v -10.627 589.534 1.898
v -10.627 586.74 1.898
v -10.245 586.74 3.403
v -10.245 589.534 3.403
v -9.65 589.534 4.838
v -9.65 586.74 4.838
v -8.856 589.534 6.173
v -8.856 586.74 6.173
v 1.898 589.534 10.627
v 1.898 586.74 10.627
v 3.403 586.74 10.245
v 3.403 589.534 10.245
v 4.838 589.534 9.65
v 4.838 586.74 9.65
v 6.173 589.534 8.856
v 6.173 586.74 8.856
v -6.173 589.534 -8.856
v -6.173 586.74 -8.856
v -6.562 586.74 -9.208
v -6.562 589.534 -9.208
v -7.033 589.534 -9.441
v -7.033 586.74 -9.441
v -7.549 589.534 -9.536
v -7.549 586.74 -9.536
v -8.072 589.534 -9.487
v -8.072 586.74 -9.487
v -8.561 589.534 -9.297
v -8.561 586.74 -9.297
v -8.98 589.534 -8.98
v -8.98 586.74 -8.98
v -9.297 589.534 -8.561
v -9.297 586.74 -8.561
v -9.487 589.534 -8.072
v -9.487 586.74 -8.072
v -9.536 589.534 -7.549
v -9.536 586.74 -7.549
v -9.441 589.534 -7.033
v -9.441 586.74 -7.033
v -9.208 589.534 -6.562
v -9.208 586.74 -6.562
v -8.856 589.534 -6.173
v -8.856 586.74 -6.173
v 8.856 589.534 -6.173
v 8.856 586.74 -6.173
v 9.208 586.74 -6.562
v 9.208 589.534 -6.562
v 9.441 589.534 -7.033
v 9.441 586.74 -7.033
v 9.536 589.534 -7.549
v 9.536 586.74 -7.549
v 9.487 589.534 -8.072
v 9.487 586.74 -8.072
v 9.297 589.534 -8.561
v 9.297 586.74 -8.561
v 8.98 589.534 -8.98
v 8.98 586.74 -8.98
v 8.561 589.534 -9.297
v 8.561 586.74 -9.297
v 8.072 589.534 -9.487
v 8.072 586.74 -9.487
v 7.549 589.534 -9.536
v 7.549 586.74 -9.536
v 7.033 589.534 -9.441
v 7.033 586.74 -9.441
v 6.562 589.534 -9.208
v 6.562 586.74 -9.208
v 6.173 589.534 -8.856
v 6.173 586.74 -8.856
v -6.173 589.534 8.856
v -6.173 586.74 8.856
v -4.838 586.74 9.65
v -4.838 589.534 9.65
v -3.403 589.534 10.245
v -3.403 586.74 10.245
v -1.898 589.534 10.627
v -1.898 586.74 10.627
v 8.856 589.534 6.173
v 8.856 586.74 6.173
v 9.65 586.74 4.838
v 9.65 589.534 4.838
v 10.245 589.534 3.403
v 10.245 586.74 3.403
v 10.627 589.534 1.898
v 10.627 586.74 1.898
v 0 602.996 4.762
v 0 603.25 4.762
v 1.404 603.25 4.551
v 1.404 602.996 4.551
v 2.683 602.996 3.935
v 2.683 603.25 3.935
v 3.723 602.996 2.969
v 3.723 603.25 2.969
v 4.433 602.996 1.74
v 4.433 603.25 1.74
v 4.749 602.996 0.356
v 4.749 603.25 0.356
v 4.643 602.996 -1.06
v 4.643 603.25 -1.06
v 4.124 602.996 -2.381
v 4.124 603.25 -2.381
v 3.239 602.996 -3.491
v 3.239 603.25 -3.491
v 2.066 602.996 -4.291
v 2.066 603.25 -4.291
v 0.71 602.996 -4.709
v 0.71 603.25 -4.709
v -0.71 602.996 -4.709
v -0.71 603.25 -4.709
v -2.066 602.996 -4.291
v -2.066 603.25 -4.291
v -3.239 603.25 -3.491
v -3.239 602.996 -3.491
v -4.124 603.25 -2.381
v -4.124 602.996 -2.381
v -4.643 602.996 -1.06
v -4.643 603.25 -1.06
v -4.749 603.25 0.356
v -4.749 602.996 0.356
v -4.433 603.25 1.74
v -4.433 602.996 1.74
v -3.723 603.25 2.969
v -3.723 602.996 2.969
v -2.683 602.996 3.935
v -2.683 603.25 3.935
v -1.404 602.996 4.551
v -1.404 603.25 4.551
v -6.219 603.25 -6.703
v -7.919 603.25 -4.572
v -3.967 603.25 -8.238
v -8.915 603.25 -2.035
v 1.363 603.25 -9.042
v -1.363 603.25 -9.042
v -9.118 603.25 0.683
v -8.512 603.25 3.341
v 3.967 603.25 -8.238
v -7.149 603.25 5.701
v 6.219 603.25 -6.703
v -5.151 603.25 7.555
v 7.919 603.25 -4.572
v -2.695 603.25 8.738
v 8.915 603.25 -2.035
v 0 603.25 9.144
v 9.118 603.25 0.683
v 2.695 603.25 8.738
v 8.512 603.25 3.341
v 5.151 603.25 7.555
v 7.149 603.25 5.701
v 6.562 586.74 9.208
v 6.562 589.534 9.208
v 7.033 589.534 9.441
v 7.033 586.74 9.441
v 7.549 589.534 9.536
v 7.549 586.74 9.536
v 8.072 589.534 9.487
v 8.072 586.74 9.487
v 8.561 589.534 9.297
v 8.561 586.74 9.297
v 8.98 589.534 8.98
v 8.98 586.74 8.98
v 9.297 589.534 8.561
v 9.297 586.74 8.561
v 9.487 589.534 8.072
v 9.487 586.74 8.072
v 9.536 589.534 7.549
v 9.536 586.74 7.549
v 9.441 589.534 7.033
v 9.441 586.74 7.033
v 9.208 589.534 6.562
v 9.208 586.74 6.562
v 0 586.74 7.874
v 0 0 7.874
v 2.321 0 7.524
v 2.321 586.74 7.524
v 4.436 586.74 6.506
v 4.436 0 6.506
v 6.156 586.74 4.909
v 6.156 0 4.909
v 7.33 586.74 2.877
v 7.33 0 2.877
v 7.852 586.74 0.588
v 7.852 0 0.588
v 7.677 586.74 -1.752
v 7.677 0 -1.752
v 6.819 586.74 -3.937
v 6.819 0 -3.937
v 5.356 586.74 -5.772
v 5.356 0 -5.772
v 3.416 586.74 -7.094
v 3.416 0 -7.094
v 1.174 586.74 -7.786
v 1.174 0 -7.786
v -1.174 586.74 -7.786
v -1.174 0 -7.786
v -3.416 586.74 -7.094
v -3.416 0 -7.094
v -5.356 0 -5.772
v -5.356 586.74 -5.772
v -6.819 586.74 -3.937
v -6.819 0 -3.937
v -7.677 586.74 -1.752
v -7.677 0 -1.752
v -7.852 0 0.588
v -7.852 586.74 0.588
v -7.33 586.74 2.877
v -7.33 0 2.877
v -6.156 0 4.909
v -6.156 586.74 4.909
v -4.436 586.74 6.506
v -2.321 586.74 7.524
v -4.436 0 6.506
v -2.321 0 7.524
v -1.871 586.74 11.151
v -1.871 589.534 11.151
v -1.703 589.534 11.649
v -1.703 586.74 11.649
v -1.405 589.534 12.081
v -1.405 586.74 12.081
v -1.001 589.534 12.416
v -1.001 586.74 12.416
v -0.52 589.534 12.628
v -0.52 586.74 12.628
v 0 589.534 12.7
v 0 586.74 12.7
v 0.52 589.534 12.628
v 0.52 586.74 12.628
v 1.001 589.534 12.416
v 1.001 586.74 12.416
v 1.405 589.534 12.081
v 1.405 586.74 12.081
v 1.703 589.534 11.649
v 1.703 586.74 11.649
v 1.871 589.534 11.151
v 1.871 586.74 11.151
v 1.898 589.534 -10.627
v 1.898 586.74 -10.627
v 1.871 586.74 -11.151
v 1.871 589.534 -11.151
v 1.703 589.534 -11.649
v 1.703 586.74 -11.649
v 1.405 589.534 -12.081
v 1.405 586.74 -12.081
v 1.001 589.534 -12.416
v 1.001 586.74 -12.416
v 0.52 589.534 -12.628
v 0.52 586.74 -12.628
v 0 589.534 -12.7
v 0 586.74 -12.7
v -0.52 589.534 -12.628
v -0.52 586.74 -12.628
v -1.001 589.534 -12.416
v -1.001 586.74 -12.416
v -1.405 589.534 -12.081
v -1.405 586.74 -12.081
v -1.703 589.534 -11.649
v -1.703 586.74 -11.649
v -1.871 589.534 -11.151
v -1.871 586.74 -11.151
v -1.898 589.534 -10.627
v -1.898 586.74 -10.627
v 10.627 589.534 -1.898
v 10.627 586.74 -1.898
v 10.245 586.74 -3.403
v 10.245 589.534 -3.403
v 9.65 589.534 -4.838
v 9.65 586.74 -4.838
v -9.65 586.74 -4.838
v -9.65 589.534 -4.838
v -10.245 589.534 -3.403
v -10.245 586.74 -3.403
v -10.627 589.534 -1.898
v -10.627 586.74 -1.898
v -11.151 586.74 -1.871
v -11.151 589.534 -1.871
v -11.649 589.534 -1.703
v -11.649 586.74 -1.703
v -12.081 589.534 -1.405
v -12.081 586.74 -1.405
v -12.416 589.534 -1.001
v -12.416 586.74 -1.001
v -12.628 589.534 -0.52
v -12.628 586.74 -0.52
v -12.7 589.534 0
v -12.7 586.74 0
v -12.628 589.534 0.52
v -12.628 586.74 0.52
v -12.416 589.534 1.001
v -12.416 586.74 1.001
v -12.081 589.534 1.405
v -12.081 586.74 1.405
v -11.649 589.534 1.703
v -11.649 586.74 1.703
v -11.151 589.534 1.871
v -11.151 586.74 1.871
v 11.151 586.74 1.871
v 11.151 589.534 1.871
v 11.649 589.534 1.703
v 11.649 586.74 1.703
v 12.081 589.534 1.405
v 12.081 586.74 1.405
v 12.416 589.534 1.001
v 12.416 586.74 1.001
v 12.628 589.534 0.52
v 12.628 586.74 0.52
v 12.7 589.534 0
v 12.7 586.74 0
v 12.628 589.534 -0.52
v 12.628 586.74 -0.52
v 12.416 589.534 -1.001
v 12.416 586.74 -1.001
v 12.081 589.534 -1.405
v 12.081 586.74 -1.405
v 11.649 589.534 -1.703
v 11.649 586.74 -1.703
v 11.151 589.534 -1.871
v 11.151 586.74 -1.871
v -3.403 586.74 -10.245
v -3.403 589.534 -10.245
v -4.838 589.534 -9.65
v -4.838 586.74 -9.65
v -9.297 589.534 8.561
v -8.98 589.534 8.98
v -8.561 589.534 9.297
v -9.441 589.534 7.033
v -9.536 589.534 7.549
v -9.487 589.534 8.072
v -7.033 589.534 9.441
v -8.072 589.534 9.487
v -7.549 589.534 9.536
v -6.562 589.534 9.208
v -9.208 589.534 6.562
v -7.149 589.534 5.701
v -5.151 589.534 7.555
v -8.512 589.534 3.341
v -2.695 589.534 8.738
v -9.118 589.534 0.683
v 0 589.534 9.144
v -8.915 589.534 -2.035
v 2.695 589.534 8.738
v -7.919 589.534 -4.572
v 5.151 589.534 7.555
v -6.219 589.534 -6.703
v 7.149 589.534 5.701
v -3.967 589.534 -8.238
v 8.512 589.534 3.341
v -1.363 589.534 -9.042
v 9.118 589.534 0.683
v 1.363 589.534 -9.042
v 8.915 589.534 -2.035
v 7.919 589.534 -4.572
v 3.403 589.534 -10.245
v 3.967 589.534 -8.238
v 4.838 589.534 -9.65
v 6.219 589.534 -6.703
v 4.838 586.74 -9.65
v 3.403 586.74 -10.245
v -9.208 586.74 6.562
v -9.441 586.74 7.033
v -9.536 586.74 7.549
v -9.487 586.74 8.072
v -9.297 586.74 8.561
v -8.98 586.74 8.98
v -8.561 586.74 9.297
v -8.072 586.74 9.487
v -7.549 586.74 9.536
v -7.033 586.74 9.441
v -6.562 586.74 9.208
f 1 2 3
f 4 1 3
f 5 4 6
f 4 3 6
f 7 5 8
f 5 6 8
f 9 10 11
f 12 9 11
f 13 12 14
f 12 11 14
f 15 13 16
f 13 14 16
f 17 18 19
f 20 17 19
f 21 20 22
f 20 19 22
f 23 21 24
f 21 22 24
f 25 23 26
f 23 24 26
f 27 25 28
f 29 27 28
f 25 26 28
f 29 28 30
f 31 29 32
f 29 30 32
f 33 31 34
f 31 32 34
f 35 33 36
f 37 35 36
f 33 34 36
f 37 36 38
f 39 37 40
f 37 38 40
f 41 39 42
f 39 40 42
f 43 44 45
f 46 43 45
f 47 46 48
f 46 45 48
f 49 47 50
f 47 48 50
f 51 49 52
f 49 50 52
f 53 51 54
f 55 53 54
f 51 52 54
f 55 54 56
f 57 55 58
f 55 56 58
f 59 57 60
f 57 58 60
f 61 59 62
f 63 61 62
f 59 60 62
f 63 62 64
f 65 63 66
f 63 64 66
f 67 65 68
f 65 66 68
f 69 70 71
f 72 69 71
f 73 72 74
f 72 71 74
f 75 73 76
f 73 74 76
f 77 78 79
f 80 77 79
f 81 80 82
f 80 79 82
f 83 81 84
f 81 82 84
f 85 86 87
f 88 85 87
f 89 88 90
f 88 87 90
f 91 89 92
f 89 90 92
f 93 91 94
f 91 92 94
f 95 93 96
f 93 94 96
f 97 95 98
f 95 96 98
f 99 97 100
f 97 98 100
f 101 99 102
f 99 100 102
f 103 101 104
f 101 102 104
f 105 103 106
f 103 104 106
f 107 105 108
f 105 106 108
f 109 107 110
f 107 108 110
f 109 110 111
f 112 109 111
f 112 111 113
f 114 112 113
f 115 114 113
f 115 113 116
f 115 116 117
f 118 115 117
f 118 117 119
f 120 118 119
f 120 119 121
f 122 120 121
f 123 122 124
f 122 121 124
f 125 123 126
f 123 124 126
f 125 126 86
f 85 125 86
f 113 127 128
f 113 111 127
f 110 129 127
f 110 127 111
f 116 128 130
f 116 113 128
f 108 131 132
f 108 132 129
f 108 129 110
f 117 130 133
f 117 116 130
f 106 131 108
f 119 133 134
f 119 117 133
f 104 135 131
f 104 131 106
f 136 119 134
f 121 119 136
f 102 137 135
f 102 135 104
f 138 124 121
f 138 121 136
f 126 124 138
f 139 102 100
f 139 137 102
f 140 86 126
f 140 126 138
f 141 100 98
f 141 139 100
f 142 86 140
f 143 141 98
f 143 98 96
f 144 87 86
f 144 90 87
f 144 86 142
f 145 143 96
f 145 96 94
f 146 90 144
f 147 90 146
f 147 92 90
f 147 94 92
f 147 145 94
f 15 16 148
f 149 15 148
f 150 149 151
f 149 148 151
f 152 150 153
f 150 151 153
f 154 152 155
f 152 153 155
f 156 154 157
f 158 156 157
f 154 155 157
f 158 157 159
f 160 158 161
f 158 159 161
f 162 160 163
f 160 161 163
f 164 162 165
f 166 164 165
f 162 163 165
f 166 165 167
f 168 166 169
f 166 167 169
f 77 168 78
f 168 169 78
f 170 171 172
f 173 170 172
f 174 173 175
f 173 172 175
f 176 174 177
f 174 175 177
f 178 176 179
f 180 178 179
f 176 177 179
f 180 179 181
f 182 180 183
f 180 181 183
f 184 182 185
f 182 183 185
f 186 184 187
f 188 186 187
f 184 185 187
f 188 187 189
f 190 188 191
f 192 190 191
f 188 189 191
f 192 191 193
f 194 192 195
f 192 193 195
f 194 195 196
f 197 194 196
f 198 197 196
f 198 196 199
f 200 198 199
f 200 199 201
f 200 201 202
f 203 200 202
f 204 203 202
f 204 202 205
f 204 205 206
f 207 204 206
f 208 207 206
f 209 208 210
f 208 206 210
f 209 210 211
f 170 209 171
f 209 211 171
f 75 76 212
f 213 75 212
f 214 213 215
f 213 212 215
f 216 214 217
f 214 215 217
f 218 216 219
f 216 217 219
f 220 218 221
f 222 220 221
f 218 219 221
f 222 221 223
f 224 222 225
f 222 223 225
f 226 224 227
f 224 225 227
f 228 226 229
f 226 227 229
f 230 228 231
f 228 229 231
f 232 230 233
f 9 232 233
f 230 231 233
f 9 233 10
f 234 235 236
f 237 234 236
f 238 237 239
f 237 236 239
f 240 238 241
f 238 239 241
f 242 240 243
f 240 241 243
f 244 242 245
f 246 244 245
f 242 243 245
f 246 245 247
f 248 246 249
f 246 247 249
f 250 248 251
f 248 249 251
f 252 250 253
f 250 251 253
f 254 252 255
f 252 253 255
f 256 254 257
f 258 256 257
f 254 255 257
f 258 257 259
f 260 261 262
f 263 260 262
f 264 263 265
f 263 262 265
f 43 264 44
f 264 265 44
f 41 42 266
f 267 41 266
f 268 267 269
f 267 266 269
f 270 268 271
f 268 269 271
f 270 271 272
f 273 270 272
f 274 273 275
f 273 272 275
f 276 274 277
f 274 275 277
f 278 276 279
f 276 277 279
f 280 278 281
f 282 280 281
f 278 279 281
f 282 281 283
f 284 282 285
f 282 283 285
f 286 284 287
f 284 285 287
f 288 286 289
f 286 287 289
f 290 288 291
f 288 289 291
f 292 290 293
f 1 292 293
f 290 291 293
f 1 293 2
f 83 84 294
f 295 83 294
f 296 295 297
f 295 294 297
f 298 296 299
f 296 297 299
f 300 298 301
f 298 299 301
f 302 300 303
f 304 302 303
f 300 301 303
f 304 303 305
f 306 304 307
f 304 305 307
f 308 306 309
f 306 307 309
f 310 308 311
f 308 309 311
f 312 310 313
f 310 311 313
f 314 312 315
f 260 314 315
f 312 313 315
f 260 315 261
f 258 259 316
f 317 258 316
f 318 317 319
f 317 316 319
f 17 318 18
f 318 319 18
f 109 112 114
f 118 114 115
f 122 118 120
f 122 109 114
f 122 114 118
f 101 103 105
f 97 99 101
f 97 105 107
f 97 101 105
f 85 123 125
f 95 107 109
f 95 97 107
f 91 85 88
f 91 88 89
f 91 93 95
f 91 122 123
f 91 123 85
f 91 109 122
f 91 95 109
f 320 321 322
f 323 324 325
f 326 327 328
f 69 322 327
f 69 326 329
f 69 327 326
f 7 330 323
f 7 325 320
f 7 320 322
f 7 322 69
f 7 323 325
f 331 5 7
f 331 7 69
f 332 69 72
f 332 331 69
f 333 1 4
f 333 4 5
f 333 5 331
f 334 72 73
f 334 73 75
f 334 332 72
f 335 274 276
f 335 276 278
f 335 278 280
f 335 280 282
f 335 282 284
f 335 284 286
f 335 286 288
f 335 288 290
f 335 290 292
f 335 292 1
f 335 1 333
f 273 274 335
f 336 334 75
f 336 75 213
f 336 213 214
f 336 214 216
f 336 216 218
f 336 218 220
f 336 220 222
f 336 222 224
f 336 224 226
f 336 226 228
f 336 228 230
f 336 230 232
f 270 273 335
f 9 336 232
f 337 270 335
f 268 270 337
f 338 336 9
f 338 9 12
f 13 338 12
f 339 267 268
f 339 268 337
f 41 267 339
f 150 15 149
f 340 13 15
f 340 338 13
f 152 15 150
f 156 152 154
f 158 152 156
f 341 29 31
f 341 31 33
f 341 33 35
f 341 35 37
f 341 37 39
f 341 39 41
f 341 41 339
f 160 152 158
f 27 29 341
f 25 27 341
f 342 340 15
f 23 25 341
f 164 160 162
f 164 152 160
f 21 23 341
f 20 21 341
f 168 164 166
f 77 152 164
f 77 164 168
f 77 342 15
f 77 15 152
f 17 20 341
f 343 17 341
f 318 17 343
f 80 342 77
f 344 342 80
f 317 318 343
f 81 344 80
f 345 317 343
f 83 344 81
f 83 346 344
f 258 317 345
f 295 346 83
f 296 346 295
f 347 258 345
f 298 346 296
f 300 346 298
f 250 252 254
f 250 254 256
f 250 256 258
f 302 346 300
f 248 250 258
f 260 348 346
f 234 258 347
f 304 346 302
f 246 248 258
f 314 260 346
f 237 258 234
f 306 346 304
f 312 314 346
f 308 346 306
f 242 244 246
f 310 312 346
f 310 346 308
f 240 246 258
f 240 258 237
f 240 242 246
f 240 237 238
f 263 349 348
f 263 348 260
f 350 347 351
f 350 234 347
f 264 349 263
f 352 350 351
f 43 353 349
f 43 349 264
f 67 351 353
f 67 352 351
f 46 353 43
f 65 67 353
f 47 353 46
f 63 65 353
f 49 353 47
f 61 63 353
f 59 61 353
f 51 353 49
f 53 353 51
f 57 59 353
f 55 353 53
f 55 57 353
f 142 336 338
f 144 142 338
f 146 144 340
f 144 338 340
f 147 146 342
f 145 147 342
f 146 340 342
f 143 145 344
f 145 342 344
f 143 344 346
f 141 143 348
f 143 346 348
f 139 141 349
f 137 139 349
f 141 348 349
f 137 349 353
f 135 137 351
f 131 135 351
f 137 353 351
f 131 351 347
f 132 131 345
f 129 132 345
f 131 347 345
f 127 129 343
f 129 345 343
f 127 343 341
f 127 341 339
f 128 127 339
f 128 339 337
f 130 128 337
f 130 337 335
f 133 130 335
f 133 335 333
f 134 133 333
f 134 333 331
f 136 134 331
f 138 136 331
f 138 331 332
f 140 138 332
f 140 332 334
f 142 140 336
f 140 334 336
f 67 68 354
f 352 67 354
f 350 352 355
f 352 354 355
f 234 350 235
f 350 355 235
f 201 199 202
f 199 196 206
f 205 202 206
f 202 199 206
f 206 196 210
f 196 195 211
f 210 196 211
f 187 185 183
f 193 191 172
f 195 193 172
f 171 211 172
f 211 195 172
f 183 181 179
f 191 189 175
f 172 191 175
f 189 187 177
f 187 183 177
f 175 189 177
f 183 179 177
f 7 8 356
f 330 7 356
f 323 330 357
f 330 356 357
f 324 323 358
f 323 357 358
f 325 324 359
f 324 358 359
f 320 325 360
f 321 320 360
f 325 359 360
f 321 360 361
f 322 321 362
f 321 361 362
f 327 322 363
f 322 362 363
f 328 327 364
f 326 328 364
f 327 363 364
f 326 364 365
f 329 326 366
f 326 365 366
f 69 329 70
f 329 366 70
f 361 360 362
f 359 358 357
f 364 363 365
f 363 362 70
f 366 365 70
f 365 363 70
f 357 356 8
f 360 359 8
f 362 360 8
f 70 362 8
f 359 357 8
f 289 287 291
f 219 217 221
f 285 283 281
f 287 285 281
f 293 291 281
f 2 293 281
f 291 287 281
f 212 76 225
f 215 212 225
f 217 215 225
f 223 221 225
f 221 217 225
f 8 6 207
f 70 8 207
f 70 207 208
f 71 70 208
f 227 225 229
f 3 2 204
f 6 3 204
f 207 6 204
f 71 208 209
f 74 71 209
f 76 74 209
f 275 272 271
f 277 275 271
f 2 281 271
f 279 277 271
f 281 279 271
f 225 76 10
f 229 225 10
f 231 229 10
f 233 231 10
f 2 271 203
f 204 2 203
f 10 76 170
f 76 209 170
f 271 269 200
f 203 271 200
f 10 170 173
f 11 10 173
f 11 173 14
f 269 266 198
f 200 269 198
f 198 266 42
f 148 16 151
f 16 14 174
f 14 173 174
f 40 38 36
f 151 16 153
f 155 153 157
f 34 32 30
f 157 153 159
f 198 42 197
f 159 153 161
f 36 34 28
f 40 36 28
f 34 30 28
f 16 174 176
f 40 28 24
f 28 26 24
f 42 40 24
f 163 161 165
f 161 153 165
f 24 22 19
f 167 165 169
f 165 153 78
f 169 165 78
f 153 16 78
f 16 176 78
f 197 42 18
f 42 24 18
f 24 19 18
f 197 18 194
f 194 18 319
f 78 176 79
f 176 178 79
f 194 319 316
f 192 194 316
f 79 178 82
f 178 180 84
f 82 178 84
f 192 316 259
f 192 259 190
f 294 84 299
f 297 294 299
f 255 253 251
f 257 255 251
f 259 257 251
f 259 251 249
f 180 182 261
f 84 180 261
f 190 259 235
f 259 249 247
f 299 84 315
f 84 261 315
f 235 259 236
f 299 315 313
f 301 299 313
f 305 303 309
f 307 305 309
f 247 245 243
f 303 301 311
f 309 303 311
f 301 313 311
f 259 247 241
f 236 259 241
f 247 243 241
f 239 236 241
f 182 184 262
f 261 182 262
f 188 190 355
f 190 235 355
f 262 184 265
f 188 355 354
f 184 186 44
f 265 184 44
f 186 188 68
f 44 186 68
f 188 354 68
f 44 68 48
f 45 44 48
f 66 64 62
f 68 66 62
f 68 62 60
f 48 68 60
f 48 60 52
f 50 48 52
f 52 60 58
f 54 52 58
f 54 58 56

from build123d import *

# Parameters (mm, degrees)
SKETCH2_R           = 7.874
BOSS_EXTRUDE1_DEPTH = 586.74
BOSS_EXTRUDE3_DEPTH = 2.794
SKETCH4_R           = 9.144
BOSS_EXTRUDE4_DEPTH = 13.716
SKETCH6_R           = 4.7625
CUT_EXTRUDE1_DEPTH  = 0.254


with BuildPart() as part:
    # Sketch2 → Boss-Extrude1 (new body)
    with BuildSketch(Plane(origin=(0, 0, 0), x_dir=(1, 0, 0), z_dir=(0, 1, 0))):
        with Locations(Location((0, 0, 0), (0, 0, 270))):
            Circle(SKETCH2_R)
    extrude(amount=BOSS_EXTRUDE1_DEPTH)

    # Sketch3 → Boss-Extrude3 (add)
    with BuildSketch(Plane(origin=(0, 586.74, 0), x_dir=(1, 0, 0), z_dir=(0, 1, 0))):
        with BuildLine():
            ThreePointArc((-8.856145882, 6.172576861), (-9.973279553, 4.131067652), (-10.626911765, 1.897569853))
            ThreePointArc((-10.626911765, 1.897569853), (-12.7, 0), (-10.626911765, -1.897569853))
            ThreePointArc((-10.626911765, -1.897569853), (-9.973279553, -4.131067652), (-8.856145882, -6.172576861))
            ThreePointArc((-8.856145882, -6.172576861), (-8.980256121, -8.980256121), (-6.172576861, -8.856145882))
            ThreePointArc((-6.172576861, -8.856145882), (-4.131067652, -9.973279553), (-1.897569853, -10.626911765))
            ThreePointArc((-1.897569853, -10.626911765), (0, -12.7), (1.897569853, -10.626911765))
            ThreePointArc((1.897569853, -10.626911765), (4.131067652, -9.973279553), (6.172576861, -8.856145882))
            ThreePointArc((6.172576861, -8.856145882), (8.980256121, -8.980256121), (8.856145882, -6.172576861))
            ThreePointArc((8.856145882, -6.172576861), (9.973279553, -4.131067652), (10.626911765, -1.897569853))
            ThreePointArc((10.626911765, -1.897569853), (12.7, 0), (10.626911765, 1.897569853))
            ThreePointArc((10.626911765, 1.897569853), (9.973279553, 4.131067652), (8.856145882, 6.172576861))
            ThreePointArc((8.856145882, 6.172576861), (8.980256121, 8.980256121), (6.172576861, 8.856145882))
            ThreePointArc((6.172576861, 8.856145882), (4.131067652, 9.973279553), (1.897569853, 10.626911765))
            ThreePointArc((1.897569853, 10.626911765), (0, 12.7), (-1.897569853, 10.626911765))
            ThreePointArc((-1.897569853, 10.626911765), (-4.131067652, 9.973279553), (-6.172576861, 8.856145882))
            ThreePointArc((-6.172576861, 8.856145882), (-8.980256121, 8.980256121), (-8.856145882, 6.172576861))
        make_face()
    extrude(amount=BOSS_EXTRUDE3_DEPTH)

    # Sketch4 → Boss-Extrude4 (add)
    with BuildSketch(Plane(origin=(0, 589.534, 0), x_dir=(1, 0, 0), z_dir=(0, 1, 0))):
        with Locations(Location((0, 0, 0), (0, 0, 270))):
            Circle(SKETCH4_R)
    extrude(amount=BOSS_EXTRUDE4_DEPTH)

    # Sketch6 → Cut-Extrude1 (cut)
    with BuildSketch(Plane(origin=(0, 603.25, 0), x_dir=(1, 0, 0), z_dir=(0, 1, 0))):
        with Locations(Location((0, 0, 0), (0, 0, 270))):
            Circle(SKETCH6_R)
    extrude(amount=-CUT_EXTRUDE1_DEPTH, mode=Mode.SUBTRACT)


solid = part.part
